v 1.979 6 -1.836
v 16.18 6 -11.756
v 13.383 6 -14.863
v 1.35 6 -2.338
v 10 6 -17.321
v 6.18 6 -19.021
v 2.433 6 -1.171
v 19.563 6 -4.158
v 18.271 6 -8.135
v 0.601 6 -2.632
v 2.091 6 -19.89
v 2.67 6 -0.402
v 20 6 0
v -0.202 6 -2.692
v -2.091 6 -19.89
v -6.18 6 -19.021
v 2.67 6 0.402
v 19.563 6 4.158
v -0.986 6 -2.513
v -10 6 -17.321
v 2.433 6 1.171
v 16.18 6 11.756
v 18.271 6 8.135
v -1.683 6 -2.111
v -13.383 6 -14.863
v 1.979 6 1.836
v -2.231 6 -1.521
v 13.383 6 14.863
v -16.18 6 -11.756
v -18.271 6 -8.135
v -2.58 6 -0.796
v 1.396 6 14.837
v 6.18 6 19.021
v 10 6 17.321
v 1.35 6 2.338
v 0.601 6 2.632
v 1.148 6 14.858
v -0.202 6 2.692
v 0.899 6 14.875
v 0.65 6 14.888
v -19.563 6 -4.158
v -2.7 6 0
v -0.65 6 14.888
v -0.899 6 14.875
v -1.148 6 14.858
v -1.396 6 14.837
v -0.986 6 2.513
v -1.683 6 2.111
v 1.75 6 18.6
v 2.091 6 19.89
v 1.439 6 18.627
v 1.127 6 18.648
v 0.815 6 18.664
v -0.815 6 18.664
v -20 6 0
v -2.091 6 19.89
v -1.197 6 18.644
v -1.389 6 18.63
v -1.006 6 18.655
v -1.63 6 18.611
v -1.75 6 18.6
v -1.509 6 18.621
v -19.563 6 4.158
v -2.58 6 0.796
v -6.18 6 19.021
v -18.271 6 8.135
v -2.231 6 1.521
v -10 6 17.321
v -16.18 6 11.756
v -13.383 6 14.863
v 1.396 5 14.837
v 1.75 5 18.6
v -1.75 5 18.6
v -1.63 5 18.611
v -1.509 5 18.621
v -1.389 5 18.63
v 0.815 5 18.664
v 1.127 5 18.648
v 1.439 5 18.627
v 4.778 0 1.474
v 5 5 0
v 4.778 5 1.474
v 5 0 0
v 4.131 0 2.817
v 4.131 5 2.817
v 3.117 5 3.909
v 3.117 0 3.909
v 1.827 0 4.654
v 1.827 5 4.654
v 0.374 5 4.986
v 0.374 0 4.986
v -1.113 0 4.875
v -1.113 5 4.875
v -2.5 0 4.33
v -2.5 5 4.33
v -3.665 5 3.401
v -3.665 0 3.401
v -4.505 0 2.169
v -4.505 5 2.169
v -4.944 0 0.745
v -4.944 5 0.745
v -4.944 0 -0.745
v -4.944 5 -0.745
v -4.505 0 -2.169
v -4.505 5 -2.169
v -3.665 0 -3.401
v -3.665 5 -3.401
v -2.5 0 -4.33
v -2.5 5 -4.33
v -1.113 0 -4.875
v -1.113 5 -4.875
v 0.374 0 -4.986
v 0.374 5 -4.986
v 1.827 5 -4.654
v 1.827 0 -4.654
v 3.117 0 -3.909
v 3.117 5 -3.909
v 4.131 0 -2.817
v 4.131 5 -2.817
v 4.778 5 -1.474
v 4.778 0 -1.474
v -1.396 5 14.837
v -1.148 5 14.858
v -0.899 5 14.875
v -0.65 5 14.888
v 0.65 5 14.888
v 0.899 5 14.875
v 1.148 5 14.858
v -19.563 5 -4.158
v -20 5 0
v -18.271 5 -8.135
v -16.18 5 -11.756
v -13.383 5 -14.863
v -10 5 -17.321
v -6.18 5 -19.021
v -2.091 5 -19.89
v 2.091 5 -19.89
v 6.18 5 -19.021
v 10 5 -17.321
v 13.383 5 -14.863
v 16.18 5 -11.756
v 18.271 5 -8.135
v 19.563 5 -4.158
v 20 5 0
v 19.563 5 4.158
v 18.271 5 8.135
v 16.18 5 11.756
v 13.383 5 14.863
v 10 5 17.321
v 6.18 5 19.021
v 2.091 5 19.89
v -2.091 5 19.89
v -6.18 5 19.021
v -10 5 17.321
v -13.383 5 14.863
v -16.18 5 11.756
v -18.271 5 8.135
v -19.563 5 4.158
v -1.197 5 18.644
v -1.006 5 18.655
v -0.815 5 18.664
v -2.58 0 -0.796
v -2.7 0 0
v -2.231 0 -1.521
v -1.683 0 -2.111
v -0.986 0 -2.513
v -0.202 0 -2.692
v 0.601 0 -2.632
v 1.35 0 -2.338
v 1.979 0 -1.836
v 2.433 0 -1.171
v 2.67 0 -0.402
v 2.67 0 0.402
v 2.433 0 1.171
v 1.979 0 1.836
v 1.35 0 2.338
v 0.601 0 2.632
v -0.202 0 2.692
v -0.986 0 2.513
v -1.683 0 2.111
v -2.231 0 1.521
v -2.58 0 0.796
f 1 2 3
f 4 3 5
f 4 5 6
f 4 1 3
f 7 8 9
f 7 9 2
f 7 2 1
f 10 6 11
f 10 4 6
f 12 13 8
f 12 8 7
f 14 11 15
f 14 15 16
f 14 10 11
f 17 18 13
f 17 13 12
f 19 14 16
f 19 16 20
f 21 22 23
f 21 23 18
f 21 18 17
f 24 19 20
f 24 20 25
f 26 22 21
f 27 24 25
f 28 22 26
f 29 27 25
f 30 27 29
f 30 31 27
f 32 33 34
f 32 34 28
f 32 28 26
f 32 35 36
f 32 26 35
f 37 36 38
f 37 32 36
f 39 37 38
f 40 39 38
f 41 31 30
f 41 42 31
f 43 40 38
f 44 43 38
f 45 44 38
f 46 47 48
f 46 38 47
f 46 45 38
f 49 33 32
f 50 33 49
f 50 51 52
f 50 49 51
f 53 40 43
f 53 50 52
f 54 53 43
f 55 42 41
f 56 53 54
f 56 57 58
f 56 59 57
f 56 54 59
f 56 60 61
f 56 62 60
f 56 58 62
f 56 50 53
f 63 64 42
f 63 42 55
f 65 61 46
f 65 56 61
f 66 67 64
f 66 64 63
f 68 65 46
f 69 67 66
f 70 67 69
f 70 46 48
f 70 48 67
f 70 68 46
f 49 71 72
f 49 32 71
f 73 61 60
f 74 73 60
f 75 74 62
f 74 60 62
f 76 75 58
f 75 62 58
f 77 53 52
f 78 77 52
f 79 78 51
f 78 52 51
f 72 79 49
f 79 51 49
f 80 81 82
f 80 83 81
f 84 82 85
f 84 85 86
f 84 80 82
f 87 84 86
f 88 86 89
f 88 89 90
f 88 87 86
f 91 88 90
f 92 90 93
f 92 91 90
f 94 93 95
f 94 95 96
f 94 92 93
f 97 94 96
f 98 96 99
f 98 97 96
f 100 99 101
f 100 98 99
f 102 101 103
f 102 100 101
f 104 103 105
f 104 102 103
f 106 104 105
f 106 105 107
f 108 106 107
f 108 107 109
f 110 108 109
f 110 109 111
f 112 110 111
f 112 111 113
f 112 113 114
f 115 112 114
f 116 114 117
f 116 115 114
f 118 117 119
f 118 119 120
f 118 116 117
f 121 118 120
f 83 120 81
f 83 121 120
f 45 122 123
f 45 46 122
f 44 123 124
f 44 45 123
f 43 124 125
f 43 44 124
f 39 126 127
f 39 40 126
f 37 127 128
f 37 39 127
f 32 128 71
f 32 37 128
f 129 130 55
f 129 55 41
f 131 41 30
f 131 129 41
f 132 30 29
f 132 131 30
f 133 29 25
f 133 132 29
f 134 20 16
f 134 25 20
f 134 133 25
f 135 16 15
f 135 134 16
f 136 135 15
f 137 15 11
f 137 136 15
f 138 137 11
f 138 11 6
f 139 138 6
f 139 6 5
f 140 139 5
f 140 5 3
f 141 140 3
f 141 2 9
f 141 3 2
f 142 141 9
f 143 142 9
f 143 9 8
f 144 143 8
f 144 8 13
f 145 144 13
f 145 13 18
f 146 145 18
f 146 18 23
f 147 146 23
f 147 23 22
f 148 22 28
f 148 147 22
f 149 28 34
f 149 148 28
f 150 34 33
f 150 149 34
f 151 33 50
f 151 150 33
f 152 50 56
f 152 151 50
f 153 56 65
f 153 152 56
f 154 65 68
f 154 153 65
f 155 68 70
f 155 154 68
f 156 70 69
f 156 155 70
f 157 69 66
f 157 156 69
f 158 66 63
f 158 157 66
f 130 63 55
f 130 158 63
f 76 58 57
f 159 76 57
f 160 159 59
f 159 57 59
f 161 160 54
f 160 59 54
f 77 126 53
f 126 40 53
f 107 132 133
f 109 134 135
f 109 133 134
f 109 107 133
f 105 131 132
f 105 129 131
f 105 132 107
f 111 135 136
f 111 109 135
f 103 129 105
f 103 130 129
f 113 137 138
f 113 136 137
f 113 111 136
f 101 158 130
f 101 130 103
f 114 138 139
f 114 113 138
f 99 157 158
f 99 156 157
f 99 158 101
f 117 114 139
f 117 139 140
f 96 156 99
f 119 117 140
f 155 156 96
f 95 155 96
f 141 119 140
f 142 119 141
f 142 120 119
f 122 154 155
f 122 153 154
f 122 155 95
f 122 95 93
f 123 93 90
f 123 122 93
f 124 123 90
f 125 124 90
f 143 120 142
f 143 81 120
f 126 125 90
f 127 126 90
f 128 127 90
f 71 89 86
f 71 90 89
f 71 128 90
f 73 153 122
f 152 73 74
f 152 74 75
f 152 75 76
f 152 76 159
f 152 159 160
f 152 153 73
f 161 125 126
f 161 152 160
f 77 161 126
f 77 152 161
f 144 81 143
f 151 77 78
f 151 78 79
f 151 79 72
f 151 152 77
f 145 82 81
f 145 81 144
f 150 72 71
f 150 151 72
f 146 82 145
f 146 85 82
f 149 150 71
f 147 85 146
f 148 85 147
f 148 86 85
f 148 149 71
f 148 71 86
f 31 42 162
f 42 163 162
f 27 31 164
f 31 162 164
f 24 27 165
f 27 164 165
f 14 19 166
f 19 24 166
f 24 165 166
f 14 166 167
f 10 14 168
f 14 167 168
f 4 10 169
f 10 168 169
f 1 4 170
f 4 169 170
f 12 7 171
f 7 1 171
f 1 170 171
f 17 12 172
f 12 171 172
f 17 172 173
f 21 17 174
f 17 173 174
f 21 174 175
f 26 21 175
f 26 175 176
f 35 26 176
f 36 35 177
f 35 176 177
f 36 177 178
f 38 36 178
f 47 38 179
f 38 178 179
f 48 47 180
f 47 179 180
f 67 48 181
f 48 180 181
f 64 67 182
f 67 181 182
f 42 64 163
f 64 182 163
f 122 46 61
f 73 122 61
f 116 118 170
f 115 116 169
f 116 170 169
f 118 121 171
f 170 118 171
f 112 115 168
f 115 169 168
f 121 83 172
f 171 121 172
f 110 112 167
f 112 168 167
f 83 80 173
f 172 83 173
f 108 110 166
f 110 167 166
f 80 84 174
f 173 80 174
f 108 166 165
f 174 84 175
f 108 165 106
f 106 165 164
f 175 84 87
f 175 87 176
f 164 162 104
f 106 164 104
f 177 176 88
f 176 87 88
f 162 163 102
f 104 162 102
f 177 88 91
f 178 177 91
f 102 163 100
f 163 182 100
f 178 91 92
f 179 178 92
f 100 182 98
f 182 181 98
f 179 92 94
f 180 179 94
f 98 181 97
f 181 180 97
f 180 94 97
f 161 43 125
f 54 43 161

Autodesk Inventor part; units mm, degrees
ref_plane "YZ Plane" through (0, 0, 0) normal (1, 0, 0) x (0, 1, 0)
ref_plane "XZ Plane" through (0, 0, 0) normal (0, 1, 0) x (-1, 0, 0)
ref_plane "XY Plane" through (0, 0, 0) normal (0, 0, 1) x (1, 0, 0)
sketch "Sketch1" plane through (0, 0, 0) normal (0, 1, 0) x (-1, 0, 0)
  circle A0 centre (0, 0) radius 20
  line L0 (0, 0) -> (20, 0)
  circle A1 centre (0, 0) radius 2.7
  dimension "d1" = 40
  dimension "d6" = 5.4
extrude "Extrusion1" add sketch "Sketch1" along normal blind 6
sketch "Sketch2" plane through (0, 0, 0) normal (0, -1, 0) x (1, 0, 0)
  circle A0 centre (0, 0) radius 2.7 projected
  circle A1 centre (0, 0) radius 20 projected
  circle A2 centre (0, 0) radius 5
  circle A3 centre (0, 0) radius 11.1111
  dimension "d7" = 10
extrude "Extrusion2" cut sketch "Sketch2" against normal blind 5 contours A1 | A3
sketch "Sketch3" plane through (0, 6, 0) normal (0, 1, 0) x (1, 0, 0)
  circle A0 centre (0, 0) radius 2.7 projected
  circle A1 centre (0, 0) radius 20 projected
  line L0 (0, 0) -> (0, -20)
  circle A2 centre (0, 0) radius 20 projected
  line L1 (2.4, -13.5) -> (2.4, -20)
  line L2 (2.4, -20) -> (-2.4, -20)
  line L3 (-2.4, -20) -> (-2.4, -13.5)
  line L4 (-2.4, -13.5) -> (2.4, -13.5)
  line L5 (2.4, -13.5) -> (-2.4, -20) construction
  line L6 (2.4, -20) -> (-2.4, -13.5) construction
  line L7 (0.25, -18.6) -> (1.75, -18.6)
  line L8 (1.75, -18.6) -> (1.75, -14.9)
  line L9 (1.75, -14.9) -> (0.25, -14.9)
  line L10 (0.25, -14.9) -> (0.25, -18.6)
  line L11 (-0.25, -18.6) -> (-1.75, -18.6)
  line L12 (-1.75, -18.6) -> (-1.75, -14.9)
  line L13 (-1.75, -14.9) -> (-0.25, -14.9)
  line L14 (-0.25, -14.9) -> (-0.25, -18.6)
  arc A3 (-0.8149, -18.6644) -> (-1.75, -18.6) centre (0, 0) ccw
  arc A4 (-0.65, -14.8879) -> (-1.3959, -14.8366) centre (0, 0) ccw
  line L15 (0, 0) -> (-0.65, -14.8879)
  line L16 (0, 0) -> (0.65, -14.8879)
  line L17 (0, 0) -> (-1.3959, -14.8366)
  line L18 (0, 0) -> (1.3959, -14.8366)
  arc A5 (-1.3959, -14.8366) -> (-0.65, -14.8879) centre (0, 0) ccw
  arc A6 (-1.3886, -18.6305) -> (-0.8149, -18.6644) centre (0, 0) ccw
  arc A7 (-1.75, -18.6) -> (-1.3886, -18.6305) centre (0, 0) ccw
  line L19 (-0.65, -14.8879) -> (-0.8149, -18.6644)
  line L20 (-1.3959, -14.8366) -> (-1.75, -18.6)
  line L21 (1.3959, -14.8366) -> (1.75, -18.6)
  line L22 (0.65, -14.8879) -> (0.8149, -18.6644)
  point P0 (0, -16.75)
  dimension "d10" = 0
  dimension "d11" = 4.8
  dimension "d12" = 6.5
  dimension "d13" = 1.5
  dimension "d14" = 3.7
  dimension "d17" = 1.4
  dimension "d40" = 2
  dimension "d41" = 0.25
  dimension "d76" = 5
  dimension "d77" = 2.5
extrude "Extrusion4" cut sketch "Sketch3" against normal blind 10 contours A5 L19 L13 L20 | L21 L9 L22 A4 | L13 L19 L11 L20 | L21 L7 L22 L9 | L11 L19 A6 A7 | A3 L22 L7
equation "\"d17\" = -0.5 * d14 + 0.5 * d12"
equation "\"d41\" = -0.5 * d13 + 0.5 * d40"
equation "\"d77\" = 0.5 * d76"
properties part number "SmallPositionDisk"
